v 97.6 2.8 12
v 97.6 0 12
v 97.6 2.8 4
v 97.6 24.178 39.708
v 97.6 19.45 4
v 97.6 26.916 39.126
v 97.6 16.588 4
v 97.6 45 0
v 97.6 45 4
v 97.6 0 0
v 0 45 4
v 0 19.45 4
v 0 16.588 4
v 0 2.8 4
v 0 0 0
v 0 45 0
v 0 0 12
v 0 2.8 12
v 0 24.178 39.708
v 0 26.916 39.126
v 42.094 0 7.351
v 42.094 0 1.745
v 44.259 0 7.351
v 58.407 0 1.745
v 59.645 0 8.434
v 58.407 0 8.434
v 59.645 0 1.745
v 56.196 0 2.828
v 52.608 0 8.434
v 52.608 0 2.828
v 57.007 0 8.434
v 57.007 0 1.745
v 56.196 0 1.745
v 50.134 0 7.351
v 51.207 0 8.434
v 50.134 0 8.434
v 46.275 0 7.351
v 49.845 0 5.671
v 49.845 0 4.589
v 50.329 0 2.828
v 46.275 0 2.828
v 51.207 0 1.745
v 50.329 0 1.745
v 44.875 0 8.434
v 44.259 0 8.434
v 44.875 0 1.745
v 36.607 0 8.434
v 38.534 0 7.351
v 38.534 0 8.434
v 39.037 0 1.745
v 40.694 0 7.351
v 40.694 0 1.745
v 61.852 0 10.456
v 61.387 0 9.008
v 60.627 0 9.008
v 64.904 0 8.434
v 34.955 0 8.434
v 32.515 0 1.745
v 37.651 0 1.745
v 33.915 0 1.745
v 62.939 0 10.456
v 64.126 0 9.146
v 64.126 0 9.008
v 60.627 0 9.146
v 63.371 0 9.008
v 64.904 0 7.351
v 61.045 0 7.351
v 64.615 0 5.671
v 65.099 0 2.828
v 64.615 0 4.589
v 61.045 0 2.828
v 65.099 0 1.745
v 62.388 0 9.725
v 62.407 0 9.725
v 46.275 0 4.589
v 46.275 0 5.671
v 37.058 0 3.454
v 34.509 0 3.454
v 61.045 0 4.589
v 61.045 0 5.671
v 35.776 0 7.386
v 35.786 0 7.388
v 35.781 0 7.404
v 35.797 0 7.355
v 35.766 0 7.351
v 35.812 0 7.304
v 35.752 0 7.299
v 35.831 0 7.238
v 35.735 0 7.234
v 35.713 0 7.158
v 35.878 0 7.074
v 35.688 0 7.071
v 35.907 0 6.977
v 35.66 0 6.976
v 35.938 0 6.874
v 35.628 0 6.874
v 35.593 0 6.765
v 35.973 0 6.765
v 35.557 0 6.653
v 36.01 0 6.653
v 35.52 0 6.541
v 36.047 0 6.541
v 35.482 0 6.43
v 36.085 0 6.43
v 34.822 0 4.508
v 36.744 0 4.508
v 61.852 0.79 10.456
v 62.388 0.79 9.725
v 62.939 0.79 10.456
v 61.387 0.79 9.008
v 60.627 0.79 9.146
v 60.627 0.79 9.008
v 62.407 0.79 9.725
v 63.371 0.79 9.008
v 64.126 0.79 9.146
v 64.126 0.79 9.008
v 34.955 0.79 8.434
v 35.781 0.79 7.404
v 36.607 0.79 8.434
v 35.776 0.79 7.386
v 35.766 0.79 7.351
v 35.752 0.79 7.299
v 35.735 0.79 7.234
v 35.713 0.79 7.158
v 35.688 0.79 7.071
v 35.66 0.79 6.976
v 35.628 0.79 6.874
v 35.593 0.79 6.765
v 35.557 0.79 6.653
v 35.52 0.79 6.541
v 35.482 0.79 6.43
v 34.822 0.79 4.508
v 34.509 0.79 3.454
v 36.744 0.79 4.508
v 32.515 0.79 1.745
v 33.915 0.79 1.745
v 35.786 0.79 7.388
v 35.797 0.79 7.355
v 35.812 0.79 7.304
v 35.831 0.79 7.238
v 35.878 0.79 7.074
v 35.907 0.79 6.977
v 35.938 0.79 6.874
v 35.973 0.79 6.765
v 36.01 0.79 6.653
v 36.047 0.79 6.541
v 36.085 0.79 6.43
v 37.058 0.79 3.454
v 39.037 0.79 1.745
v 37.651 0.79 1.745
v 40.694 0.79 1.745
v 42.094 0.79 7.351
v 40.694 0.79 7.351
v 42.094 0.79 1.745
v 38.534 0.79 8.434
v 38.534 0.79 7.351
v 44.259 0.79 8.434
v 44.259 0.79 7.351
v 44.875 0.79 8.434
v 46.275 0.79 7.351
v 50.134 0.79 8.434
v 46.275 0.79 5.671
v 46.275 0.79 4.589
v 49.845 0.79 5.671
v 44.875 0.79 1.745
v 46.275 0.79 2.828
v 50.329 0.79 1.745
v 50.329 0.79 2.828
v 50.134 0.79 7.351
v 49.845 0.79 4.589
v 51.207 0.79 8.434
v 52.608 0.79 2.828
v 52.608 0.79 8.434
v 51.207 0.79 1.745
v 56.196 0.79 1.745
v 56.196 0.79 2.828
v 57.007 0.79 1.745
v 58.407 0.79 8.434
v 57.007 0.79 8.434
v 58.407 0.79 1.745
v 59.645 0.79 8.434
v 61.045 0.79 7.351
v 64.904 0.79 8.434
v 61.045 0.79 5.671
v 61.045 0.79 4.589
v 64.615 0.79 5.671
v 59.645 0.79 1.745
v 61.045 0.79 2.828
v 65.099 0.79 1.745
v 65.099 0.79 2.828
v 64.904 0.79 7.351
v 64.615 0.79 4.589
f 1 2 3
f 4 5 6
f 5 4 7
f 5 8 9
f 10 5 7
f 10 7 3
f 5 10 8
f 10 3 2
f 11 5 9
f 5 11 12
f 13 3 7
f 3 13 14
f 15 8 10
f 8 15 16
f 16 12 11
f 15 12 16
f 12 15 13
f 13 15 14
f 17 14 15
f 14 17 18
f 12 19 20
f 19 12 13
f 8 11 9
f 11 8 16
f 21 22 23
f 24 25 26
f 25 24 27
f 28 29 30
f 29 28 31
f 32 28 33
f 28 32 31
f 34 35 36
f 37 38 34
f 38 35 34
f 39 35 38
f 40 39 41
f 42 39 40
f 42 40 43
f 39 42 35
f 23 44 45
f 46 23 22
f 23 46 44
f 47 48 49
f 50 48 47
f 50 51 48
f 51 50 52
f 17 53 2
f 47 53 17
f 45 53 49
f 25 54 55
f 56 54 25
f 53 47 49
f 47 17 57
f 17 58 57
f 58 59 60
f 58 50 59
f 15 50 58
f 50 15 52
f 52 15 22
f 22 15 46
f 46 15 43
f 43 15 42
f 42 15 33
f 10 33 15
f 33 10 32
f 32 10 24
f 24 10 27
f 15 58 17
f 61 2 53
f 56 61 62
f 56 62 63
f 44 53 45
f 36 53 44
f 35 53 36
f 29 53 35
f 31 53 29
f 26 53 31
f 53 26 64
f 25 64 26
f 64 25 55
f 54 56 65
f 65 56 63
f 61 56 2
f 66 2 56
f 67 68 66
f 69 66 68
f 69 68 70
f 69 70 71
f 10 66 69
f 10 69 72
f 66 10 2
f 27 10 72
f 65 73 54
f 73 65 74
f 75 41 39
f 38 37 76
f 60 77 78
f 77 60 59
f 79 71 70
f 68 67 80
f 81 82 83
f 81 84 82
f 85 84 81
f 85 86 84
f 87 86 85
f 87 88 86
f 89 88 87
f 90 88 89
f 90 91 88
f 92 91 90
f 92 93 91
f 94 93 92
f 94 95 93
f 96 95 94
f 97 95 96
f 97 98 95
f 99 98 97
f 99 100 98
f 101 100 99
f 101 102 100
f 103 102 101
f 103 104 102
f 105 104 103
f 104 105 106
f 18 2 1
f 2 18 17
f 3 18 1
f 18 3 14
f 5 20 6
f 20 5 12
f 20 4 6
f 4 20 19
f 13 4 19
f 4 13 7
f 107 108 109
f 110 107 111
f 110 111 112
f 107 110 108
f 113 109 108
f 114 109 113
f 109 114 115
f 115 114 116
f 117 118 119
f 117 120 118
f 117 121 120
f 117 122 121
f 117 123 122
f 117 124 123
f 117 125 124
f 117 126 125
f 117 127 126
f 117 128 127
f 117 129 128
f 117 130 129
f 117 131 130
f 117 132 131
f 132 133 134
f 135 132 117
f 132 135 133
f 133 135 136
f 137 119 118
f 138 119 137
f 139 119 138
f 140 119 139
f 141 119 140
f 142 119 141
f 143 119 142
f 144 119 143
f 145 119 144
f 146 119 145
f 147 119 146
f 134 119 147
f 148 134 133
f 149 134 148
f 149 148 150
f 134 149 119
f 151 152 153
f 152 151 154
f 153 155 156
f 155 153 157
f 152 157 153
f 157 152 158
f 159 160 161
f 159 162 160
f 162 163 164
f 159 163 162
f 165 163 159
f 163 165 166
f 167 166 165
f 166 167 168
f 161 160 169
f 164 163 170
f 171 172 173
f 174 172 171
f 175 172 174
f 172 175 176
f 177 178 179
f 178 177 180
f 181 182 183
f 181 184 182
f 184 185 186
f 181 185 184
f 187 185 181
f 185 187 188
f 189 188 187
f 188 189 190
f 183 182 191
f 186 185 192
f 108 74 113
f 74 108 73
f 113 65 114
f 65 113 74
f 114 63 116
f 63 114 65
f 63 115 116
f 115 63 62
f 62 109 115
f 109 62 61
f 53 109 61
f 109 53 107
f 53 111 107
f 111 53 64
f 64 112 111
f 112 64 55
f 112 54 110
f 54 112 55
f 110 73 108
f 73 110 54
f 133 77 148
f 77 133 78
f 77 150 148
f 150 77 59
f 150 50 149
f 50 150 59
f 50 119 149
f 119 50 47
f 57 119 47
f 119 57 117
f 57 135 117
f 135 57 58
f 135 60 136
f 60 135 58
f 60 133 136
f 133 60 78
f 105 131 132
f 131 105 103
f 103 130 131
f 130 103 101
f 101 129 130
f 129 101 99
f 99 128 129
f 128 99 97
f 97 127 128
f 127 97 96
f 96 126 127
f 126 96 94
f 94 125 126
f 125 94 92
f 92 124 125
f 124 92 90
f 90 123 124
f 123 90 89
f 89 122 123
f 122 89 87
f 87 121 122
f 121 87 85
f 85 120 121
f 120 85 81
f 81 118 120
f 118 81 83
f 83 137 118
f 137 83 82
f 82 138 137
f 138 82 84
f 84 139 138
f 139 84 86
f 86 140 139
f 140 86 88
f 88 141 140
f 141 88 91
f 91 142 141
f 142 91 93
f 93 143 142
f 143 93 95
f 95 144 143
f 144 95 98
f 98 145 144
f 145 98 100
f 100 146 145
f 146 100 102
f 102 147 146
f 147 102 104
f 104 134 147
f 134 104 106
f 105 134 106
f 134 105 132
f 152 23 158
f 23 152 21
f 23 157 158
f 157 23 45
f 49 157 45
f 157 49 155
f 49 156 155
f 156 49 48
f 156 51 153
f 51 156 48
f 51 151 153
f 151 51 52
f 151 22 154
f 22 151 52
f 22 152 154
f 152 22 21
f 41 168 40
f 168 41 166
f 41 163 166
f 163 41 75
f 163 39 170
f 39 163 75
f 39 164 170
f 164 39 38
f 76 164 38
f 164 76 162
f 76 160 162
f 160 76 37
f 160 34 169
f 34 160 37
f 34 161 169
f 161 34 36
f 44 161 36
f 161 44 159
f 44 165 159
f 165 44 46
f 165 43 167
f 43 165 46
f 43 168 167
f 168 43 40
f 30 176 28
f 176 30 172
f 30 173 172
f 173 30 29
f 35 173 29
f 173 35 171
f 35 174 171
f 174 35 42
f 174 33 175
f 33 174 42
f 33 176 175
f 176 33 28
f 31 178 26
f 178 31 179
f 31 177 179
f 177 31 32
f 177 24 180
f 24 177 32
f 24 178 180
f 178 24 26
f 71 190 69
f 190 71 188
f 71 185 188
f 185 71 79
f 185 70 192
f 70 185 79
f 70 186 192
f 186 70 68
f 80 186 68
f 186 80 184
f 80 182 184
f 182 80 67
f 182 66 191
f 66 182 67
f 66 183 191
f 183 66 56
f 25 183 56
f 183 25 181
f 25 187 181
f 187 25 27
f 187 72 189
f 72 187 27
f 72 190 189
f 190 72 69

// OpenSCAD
// Porta-cartão de mesa - impressão 3D
card_w = 90;         // largura do cartão (mm)
card_h = 50;         // altura do cartão (mm)
stack = 12;          // espessura da pilha de cartões (mm)
wall = 2.8;          // espessura das paredes (mm)
clearance = 1;       // folga para os cartões (mm)
tilt = 12;           // inclinação do encosto (graus)
base_d = 45;         // profundidade da base (mm)
base_h = 4;          // altura da base (mm)
lip_h = 12;          // altura da aba da frente (mm)
back_h = 40;         // altura do encosto (mm)
word = "ATELIÊ";     // texto gravado
font_size = 7;       // altura da letra (mm)
engrave = 0.8;       // profundidade da gravação (mm)

body_w = card_w + 2 * clearance + 2 * wall;
pocket = stack + clearance;

difference() {
    union() {
        cube([body_w, base_d, base_h]);
        cube([body_w, wall, lip_h]);
        translate([0, wall + pocket + wall, 0])
            rotate([-tilt, 0, 0])
                translate([0, -wall, 0])
                    cube([body_w, wall, back_h]);
    }
    translate([body_w / 2, -0.01, lip_h / 2])
        rotate([90, 0, 0])
            translate([0, 0, -engrave])
                linear_extrude(engrave + 0.01)
                    text(word, size = font_size, font = "Liberation Sans:style=Bold",
                         halign = "center", valign = "center");
}

echo(str("Largura: ", body_w, " mm"));
echo(str("Profundidade: ", base_d, " mm"));
echo(str("Altura: ", back_h * cos(tilt) + wall * sin(tilt), " mm"));
